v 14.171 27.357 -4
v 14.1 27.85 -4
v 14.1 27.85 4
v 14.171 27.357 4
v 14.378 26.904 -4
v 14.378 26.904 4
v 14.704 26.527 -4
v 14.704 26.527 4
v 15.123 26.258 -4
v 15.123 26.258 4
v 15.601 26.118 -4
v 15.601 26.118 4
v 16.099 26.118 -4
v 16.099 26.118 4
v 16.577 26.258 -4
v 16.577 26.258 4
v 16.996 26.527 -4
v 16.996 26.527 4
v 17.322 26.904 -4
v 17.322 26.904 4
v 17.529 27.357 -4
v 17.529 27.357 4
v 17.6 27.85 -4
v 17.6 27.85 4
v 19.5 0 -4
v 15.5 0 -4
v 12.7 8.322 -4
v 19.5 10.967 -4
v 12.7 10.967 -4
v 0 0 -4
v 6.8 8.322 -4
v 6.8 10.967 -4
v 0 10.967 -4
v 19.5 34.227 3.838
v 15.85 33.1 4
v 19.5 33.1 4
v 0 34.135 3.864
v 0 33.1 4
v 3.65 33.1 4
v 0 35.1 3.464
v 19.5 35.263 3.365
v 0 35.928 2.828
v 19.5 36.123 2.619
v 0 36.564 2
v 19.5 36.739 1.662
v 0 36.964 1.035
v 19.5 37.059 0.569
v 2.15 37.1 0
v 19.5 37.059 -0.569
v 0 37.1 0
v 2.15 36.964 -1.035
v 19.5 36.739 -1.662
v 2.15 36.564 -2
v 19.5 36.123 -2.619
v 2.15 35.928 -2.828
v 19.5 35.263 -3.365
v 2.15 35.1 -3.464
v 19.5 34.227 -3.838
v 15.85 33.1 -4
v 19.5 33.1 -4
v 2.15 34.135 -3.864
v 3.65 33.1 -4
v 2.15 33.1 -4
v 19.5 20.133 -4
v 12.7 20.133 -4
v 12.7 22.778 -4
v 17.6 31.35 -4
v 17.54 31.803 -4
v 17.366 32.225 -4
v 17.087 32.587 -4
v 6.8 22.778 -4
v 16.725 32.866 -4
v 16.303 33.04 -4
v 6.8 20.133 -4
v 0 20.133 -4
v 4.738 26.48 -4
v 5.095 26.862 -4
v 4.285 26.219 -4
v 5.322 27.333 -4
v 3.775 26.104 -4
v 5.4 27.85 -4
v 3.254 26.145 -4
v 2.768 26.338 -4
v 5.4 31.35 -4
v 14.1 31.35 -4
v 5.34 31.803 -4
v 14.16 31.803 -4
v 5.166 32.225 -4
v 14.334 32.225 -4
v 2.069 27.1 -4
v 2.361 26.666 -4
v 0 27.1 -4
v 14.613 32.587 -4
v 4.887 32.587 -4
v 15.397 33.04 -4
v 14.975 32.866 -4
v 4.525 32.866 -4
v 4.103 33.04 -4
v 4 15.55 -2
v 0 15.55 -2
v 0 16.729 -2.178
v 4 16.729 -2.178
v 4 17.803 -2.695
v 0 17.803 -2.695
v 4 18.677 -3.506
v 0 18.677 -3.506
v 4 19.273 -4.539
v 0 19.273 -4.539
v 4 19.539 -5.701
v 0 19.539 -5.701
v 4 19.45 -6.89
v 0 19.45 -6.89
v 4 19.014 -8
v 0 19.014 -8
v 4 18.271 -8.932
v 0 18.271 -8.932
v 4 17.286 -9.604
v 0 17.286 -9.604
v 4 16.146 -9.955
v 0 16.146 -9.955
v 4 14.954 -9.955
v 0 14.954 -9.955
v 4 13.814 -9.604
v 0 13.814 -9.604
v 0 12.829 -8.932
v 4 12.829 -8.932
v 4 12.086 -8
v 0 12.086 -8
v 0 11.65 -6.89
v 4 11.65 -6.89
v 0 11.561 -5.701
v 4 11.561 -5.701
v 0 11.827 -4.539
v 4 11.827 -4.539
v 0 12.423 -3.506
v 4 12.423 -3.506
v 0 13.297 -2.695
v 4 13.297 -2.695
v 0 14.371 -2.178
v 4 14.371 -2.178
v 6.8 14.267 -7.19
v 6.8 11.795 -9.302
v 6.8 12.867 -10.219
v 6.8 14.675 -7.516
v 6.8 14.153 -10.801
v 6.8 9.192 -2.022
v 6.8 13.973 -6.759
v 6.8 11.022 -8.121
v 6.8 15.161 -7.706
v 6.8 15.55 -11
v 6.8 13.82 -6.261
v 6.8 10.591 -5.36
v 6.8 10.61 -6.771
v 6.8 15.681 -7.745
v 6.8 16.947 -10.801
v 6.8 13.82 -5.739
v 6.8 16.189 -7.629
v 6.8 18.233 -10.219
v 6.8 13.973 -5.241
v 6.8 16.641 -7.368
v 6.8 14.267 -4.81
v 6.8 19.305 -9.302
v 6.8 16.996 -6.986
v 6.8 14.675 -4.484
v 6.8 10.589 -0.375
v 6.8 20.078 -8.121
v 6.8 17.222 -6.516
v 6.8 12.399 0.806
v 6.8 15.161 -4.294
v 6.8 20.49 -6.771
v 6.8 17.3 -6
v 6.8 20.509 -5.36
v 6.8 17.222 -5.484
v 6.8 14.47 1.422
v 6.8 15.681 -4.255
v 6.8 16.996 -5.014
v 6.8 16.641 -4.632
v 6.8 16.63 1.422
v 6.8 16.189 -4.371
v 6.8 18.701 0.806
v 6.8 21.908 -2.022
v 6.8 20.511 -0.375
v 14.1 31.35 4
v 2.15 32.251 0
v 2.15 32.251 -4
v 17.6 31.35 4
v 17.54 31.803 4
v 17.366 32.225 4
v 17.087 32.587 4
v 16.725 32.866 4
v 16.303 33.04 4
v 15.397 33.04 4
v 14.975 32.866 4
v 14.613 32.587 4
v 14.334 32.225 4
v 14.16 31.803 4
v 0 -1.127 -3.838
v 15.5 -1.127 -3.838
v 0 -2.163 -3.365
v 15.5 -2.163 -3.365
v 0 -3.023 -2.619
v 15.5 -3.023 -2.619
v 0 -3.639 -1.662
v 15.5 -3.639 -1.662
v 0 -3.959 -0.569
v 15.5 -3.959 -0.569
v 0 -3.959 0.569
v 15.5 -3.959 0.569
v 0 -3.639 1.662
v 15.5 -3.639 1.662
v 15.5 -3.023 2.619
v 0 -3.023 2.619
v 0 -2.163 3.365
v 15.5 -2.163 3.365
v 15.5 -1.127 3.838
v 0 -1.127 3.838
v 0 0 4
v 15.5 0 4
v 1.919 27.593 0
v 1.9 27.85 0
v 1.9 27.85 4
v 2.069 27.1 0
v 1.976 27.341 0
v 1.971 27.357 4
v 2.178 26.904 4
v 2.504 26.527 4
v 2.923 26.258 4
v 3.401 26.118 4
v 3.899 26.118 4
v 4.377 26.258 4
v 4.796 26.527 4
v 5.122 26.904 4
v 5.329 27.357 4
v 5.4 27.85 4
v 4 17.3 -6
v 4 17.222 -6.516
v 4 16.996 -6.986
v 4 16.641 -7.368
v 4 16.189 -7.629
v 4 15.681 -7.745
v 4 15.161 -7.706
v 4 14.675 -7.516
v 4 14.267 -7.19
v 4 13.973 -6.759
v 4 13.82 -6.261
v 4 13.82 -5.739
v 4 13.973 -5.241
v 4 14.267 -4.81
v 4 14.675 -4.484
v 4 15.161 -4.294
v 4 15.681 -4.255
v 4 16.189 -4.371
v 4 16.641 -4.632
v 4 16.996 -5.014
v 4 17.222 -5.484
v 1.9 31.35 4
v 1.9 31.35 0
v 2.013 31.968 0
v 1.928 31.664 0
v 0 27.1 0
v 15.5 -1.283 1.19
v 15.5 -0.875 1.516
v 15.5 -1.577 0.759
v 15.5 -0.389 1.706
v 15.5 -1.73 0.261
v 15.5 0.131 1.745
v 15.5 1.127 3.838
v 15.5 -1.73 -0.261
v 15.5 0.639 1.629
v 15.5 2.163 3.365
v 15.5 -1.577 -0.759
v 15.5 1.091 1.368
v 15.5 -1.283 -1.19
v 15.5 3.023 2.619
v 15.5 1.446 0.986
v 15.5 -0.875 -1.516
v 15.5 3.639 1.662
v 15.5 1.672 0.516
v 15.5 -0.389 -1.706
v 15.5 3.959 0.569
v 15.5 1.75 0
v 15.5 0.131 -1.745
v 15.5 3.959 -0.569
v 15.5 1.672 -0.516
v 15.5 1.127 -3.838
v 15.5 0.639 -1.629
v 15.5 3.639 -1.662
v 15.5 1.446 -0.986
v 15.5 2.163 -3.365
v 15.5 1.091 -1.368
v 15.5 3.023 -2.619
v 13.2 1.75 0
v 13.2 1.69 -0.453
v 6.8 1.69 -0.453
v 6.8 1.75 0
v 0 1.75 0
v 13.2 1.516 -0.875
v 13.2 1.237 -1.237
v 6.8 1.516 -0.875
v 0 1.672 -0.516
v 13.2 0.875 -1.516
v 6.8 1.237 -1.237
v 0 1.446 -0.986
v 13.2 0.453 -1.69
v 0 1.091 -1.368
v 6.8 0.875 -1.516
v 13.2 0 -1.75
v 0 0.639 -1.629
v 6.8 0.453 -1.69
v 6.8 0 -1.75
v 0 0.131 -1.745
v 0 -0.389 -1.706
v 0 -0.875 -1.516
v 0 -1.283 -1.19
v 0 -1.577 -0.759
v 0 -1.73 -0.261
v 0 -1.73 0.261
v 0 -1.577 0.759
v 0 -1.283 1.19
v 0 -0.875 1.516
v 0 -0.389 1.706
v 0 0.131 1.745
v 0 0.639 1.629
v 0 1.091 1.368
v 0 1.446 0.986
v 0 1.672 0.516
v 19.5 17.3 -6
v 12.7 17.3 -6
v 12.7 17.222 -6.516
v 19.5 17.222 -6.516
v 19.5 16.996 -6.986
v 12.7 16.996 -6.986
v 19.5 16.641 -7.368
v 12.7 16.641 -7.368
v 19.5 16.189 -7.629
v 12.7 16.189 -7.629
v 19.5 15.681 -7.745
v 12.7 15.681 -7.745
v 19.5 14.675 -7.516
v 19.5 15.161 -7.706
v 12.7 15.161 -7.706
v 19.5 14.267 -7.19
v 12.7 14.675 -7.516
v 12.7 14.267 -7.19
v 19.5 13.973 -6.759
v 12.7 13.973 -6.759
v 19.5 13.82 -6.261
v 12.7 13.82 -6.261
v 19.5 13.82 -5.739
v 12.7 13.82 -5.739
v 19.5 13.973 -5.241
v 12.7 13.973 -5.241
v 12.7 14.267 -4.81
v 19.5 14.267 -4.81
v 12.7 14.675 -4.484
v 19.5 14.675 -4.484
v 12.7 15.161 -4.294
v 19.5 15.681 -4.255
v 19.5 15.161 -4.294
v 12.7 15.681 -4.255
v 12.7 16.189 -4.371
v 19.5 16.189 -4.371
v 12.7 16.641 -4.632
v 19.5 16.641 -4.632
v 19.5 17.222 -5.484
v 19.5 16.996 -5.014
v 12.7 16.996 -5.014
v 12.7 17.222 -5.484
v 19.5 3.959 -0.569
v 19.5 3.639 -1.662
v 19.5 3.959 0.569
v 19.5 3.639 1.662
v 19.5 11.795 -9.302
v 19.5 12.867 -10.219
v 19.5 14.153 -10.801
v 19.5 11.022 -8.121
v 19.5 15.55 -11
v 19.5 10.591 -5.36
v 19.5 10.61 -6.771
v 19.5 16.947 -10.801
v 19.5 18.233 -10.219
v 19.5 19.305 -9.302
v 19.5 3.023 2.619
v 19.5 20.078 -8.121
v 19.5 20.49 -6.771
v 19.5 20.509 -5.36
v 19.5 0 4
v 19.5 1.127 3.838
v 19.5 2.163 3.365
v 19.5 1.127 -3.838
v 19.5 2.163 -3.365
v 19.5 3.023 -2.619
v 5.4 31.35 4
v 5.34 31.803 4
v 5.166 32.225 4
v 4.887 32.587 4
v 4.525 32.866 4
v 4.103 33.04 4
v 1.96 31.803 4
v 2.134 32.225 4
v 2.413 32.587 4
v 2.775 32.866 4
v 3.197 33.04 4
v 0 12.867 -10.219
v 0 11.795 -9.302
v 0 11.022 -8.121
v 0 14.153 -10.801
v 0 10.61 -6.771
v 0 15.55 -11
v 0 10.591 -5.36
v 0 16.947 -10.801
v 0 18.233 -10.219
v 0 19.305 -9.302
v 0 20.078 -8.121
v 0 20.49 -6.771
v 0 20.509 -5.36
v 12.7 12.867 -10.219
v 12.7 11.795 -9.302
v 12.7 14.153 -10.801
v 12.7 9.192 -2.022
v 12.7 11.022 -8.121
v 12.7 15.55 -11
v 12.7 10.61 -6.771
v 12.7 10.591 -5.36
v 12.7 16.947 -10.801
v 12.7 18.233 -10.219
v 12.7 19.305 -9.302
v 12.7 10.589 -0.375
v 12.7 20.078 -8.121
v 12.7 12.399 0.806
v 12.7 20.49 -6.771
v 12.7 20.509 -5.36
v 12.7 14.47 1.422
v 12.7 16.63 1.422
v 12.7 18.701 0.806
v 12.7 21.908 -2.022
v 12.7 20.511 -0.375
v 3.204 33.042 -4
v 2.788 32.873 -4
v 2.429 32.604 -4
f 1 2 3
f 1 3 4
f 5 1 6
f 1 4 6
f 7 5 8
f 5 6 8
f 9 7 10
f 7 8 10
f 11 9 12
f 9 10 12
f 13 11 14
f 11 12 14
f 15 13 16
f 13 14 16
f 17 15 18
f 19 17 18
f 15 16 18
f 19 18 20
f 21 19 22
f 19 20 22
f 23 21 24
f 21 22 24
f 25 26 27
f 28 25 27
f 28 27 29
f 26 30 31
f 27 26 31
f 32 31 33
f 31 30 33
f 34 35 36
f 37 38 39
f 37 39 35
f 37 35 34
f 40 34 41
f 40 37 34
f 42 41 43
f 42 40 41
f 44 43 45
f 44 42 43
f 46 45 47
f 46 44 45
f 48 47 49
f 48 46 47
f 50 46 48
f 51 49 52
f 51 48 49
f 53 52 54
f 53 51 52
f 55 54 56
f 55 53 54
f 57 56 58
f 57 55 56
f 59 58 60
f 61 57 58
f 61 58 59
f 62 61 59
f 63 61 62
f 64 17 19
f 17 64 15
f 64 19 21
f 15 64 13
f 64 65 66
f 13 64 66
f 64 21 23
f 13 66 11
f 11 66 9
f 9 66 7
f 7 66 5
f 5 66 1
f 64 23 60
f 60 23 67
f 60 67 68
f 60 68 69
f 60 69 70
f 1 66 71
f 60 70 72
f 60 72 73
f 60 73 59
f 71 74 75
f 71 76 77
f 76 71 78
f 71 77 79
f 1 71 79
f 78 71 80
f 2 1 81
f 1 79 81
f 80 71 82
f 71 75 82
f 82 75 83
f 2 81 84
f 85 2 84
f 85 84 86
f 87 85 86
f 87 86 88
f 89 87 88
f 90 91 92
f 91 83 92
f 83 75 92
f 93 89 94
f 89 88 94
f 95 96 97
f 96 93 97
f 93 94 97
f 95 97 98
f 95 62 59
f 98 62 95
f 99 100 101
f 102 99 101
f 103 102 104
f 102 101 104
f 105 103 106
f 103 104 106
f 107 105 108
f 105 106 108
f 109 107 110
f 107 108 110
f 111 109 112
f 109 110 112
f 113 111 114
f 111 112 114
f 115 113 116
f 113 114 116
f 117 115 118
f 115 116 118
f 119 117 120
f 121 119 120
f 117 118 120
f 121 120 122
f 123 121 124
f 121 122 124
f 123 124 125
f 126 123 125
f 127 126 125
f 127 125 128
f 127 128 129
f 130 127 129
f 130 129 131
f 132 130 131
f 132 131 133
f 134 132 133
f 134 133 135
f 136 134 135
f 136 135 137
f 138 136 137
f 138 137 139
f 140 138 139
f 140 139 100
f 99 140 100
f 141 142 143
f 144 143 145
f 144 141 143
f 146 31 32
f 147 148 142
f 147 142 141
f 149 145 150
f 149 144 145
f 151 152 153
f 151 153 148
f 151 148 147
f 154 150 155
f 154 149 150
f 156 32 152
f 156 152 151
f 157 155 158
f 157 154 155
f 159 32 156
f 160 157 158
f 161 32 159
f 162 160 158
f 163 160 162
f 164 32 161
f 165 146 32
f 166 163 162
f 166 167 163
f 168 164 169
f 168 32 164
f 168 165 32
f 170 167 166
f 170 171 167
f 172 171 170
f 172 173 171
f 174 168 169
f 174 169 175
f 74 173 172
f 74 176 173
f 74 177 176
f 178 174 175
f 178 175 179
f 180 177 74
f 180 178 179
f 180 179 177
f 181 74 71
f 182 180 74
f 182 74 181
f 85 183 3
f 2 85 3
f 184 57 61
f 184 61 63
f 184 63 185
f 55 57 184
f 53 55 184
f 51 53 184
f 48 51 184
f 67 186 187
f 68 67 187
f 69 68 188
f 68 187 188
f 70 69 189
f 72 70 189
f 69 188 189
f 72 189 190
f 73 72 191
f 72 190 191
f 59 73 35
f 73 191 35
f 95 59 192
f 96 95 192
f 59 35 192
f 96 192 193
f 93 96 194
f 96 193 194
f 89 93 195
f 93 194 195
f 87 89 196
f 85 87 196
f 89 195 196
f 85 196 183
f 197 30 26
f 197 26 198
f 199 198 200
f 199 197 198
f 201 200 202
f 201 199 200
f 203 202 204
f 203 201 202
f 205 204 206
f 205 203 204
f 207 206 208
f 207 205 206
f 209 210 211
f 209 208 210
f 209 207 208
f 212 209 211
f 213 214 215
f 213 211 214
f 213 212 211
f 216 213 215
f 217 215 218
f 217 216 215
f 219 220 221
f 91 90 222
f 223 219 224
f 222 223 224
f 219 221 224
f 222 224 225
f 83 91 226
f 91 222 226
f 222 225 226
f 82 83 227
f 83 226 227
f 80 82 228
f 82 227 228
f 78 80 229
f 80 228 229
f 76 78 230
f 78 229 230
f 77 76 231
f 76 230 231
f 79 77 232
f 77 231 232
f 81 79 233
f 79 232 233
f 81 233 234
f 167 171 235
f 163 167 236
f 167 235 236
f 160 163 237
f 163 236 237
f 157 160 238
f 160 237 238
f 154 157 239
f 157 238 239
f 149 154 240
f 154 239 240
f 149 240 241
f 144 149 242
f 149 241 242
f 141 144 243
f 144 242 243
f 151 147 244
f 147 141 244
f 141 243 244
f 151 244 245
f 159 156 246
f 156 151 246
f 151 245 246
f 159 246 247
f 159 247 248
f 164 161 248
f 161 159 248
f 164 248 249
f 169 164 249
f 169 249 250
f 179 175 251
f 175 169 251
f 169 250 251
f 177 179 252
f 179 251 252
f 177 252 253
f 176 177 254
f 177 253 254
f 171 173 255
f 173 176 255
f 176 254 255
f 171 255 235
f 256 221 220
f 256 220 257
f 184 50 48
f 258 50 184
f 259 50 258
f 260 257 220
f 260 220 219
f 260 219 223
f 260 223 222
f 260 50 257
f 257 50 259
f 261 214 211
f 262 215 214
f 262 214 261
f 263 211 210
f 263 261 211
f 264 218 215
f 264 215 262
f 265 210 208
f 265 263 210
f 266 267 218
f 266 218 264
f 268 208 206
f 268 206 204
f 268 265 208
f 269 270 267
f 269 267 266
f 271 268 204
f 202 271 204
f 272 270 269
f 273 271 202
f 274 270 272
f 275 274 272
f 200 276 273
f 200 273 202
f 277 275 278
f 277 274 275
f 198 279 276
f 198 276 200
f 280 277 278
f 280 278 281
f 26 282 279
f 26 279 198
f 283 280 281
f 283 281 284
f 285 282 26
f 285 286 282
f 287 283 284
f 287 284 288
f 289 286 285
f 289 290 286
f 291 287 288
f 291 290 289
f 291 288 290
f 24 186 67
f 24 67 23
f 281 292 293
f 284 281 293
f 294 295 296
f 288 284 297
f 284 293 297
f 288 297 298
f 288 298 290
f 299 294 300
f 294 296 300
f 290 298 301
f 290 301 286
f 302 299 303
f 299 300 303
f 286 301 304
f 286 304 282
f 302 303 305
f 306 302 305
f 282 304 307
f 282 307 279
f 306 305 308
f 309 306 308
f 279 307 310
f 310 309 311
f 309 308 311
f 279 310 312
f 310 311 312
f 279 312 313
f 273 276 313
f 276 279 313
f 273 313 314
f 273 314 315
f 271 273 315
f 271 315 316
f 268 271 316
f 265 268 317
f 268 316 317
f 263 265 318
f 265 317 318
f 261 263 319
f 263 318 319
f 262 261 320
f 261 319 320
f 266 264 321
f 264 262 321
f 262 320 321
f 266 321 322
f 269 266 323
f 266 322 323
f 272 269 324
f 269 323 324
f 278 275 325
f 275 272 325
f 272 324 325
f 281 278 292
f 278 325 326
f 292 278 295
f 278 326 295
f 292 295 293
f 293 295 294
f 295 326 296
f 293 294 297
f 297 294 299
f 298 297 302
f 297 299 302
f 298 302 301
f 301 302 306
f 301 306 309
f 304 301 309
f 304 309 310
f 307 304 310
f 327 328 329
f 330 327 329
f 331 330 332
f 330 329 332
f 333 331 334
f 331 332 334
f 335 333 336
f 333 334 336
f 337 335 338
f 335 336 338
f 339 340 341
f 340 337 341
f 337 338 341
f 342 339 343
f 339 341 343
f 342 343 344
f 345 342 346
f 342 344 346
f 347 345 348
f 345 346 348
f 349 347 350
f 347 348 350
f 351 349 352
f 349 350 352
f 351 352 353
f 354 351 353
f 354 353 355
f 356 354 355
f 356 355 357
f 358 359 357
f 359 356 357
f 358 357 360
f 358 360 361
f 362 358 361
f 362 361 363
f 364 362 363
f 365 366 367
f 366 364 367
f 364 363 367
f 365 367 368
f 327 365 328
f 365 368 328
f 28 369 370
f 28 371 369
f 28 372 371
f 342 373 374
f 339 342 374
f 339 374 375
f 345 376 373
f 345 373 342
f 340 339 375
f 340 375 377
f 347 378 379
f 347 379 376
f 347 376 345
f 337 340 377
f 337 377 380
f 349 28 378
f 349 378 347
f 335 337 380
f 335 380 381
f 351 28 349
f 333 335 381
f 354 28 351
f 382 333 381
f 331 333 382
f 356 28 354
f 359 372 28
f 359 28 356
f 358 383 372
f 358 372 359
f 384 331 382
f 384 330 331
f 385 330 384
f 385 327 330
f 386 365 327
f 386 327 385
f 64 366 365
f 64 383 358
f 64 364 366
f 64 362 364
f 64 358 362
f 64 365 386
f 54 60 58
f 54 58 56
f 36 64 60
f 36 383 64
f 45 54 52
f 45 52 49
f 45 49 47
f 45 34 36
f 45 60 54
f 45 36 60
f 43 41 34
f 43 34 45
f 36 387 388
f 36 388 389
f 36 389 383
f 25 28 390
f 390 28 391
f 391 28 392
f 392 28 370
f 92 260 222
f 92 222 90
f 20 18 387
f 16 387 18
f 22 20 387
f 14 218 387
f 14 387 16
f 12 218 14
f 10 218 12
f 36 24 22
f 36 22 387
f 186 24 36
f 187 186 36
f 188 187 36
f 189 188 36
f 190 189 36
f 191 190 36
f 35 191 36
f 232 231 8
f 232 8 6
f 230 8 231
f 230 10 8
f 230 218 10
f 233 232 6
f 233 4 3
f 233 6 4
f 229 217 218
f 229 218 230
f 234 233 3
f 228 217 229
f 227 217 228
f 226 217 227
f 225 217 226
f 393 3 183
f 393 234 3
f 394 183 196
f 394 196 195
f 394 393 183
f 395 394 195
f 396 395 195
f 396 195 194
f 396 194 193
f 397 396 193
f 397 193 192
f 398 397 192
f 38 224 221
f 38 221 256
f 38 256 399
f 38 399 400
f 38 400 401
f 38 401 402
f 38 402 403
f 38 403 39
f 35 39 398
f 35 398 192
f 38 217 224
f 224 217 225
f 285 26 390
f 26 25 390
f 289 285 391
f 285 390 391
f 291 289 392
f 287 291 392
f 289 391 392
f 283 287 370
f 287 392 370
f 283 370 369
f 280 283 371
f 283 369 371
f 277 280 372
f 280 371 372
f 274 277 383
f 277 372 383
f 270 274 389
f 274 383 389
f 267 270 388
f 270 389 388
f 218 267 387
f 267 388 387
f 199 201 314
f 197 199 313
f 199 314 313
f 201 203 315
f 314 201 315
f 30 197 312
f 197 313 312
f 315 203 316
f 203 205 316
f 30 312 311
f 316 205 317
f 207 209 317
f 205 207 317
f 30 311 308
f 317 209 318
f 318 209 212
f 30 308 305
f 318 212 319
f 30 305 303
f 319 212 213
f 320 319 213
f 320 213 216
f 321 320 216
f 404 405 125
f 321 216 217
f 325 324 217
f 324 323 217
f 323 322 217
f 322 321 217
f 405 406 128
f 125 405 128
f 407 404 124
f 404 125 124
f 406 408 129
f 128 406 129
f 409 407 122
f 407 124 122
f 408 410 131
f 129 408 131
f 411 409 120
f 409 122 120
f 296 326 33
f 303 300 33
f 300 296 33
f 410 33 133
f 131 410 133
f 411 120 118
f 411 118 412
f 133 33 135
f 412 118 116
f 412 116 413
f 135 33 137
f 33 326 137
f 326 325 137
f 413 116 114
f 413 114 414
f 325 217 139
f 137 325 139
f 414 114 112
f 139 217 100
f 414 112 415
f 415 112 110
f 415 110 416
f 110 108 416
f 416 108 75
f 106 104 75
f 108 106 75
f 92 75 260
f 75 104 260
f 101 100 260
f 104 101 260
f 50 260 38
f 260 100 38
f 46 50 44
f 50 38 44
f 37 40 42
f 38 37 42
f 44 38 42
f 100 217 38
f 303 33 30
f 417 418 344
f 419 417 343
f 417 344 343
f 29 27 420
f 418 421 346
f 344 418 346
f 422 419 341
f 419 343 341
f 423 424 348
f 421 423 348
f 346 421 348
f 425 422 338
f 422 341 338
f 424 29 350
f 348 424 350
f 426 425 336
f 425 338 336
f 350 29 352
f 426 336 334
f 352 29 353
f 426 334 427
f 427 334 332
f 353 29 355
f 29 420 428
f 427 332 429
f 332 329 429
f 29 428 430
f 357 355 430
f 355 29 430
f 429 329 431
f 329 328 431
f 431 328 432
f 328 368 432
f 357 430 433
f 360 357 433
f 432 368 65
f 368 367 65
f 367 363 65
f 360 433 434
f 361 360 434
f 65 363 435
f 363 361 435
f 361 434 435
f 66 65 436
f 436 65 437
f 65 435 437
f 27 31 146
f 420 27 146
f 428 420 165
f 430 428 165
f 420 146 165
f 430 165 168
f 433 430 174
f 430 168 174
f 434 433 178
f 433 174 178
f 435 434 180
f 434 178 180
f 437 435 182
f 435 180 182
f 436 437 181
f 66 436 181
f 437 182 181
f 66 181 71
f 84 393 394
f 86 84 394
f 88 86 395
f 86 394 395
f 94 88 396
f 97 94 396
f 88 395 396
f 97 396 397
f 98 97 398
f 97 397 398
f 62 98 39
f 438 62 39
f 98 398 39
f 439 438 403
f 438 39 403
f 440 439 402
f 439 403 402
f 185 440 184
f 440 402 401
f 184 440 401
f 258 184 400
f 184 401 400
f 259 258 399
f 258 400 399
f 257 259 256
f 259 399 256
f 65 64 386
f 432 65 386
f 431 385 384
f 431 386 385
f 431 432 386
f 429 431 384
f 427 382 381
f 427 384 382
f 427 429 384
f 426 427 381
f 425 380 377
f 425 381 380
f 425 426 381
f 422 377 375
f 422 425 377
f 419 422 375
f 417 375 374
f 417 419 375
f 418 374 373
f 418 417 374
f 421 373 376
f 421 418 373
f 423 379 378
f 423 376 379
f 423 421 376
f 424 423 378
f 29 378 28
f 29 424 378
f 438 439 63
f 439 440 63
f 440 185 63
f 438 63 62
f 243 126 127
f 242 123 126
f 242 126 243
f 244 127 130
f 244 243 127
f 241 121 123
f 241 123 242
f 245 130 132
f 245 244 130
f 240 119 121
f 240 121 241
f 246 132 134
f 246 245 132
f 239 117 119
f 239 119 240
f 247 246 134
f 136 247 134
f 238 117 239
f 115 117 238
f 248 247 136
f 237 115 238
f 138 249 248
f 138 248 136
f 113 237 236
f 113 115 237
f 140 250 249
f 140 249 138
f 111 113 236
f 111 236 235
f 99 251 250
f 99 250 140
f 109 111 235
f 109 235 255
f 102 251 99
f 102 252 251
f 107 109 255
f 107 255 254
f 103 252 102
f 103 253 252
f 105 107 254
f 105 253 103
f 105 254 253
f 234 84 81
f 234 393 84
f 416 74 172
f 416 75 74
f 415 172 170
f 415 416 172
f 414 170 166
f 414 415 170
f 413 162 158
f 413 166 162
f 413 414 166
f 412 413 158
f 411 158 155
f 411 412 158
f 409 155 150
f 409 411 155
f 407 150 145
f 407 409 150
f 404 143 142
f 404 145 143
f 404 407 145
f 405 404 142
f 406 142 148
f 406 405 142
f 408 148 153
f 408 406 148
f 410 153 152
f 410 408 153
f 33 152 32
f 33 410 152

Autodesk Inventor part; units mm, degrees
ref_plane "XZ Plane" through (0, 0, 0) normal (0, 1, 0) x (-1, 0, 0)
ref_plane "XY Plane" through (0, 0, 0) normal (0, 0, 1) x (1, 0, 0)
sketch "Sketch1" plane through (0, 0, 0) normal (1, 0, 0) x (0, 1, 0)
  circle A0 centre (0, 0) radius 1.75
  arc A1 (0, 4) -> (0, -4) centre (0, 0) ccw
  line L0 (0, 0) -> (15.55, 0) construction
  line L1 (15.55, -4) -> (15.55, -6) construction
  line L2 (15.55, 0) -> (33.1, 0) construction
  arc A2 (33.1, -4) -> (33.1, 4) centre (33.1, 0) ccw
  line L3 (0, 4) -> (33.1, 4)
  arc A3 (10.9674, -4) -> (20.1326, -4) centre (15.55, -6) ccw
  circle A4 centre (15.55, -6) radius 1.75
  line L4 (0, -4) -> (10.9674, -4)
  line L5 (20.1326, -4) -> (33.1, -4)
  dimension "d0" = 3.5
  dimension "d1" = 8
  dimension "d2" = 15.55
  dimension "d4" = 17.55
  dimension "d5" = 8
  dimension "d6" = 10
  dimension "d7" = 10
  dimension "d9" = 3.5
  dimension "d37" = 15.55
extrude "Extrusion1" add sketch "Sketch1" along normal blind 6.8
sketch "Sketch2" plane through (6.8, 0, 0) normal (1, 0, 0) x (0, 0, -1)
  line L0 (0, 15.55) -> (6, 15.55) construction
  arc A0 (4, 22.7784) -> (4, 8.3216) centre (6, 15.55) ccw
  arc A1 (-4, 0) -> (4, 0) centre (0, 0) ccw construction
  line L1 (4, 0) -> (4, 8.3216) construction
  arc A2 (4, 33.1) -> (-4, 33.1) centre (0, 33.1) ccw construction
  line L2 (4, 22.7784) -> (4, 33.1) construction
  circle A3 centre (0, 0) radius 1.75
  arc A4 (-4, 0) -> (4, 0) centre (0, 0) ccw
  arc A5 (4, 33.1) -> (-4, 33.1) centre (0, 33.1) ccw
  line L3 (-4, 33.1) -> (-4, 0)
  line L4 (4, 0) -> (4, 8.3216)
  line L5 (-4, 33.1) -> (-4, 0) projected
  line L6 (4, 22.7784) -> (4, 33.1)
  dimension "d12" = 15.55
  dimension "d14" = 15
  dimension "d39" = 10
extrude "Extrusion2" add sketch "Sketch2" along normal blind 6.4
ref_plane "Work Plane1" through (12.7, 0, 0) normal (1, 0, 0) x (0, 1, 0)
sketch "Sketch3" plane through (12.7, 0, 0) normal (1, 0, 0) x (0, 1, 0)
  circle A0 centre (0, 0) radius 1.75
  arc A1 (0, 4) -> (0, -4) centre (0, 0) ccw
  line L0 (0, 0) -> (15.55, 0) construction
  line L1 (15.55, -4) -> (15.55, -6) construction
  line L2 (15.55, 0) -> (33.1, 0) construction
  arc A2 (33.1, -4) -> (33.1, 4) centre (33.1, 0) ccw
  line L3 (0, 4) -> (33.1, 4)
  arc A3 (10.9674, -4) -> (20.1326, -4) centre (15.55, -6) ccw
  circle A4 centre (15.55, -6) radius 1.75
  line L4 (0, -4) -> (10.9674, -4)
  line L5 (20.1326, -4) -> (33.1, -4)
  dimension "d18" = 3.5
  dimension "d19" = 8
  dimension "d20" = 15.55
  dimension "d21" = 17.55
  dimension "d22" = 8
  dimension "d23" = 10
  dimension "d24" = 10
  dimension "d26" = 3.5
  dimension "d38" = 15.55
extrude "Extrusion3" add sketch "Sketch3" along normal blind 6.8
sketch "Sketch4" plane through (0, 0, 4) normal (0, 0, 1) x (1, 0, 0)
  arc A0 (5.4, 31.35) -> (1.9, 31.35) centre (3.65, 31.35) ccw
  arc A1 (17.6, 31.35) -> (14.1, 31.35) centre (15.85, 31.35) ccw
  line L0 (0, 33.1) -> (0, 0) projected
  line L1 (0, 33.1) -> (19.5, 33.1) projected
  line L2 (19.5, 33.1) -> (19.5, 0) projected
  arc A2 (14.1, 27.85) -> (17.6, 27.85) centre (15.85, 27.85) ccw
  arc A3 (1.9, 27.85) -> (5.4, 27.85) centre (3.65, 27.85) ccw
  line L3 (17.6, 31.35) -> (17.6, 27.85)
  line L4 (14.1, 31.35) -> (14.1, 27.85)
  line L5 (5.4, 31.35) -> (5.4, 27.85)
  line L6 (1.9, 27.85) -> (1.9, 31.35)
  line L7 (0, 20.1326) -> (0, 33.1) projected
  dimension "d29" = 3.5
  dimension "d30" = 3.5
  dimension "d31" = 3.65
  dimension "d32" = 3.65
  dimension "d47" = 3.5
  dimension "d48" = 3.5
  dimension "d49" = 3.65
  dimension "d50" = 3.65
extrude "Extrusion5" cut sketch "Sketch4" against normal blind 8
sketch "Sketch5" plane through (0, 0, 0) normal (-1, 0, 0) x (0, 0, 1)
  arc A0 (4, 33.1) -> (-4, 33.1) centre (0, 33.1) ccw projected
  line L0 (0, 37.1) -> (0, 27.1)
  line L1 (0, 27.1) -> (-4, 27.1)
  line L2 (-4, 20.1326) -> (-4, 33.1) projected
  point P0 (0, 0)
  dimension "d40" = 10
  dimension "d41" = 4
extrude "Extrusion6" cut sketch "Sketch5" against normal blind 2.15
sketch "Sketch6" plane through (19.5, 0, 0) normal (1, 0, 0) x (0, 0, -1)
  point P0 (0, 0)
sketch "Sketch7" plane through (19.5, 0, 0) normal (1, 0, 0) x (0, 0, -1)
  circle A0 centre (0, 0) radius 4
  dimension "d44" = 8
extrude "Extrusion7" cut sketch "Sketch7" against normal blind 4
sketch "Sketch8" plane through (0, 0, 0) normal (-1, 0, 0) x (0, 0, 1)
  arc A0 (-4, 20.1326) -> (-4, 10.9674) centre (-6, 15.55) ccw projected
  circle A1 centre (-6, 15.55) radius 4
  point P0 (0, 0)
  dimension "d51" = 8
extrude "Extrusion8" cut sketch "Sketch8" against normal blind 4
properties part number "armv2"
